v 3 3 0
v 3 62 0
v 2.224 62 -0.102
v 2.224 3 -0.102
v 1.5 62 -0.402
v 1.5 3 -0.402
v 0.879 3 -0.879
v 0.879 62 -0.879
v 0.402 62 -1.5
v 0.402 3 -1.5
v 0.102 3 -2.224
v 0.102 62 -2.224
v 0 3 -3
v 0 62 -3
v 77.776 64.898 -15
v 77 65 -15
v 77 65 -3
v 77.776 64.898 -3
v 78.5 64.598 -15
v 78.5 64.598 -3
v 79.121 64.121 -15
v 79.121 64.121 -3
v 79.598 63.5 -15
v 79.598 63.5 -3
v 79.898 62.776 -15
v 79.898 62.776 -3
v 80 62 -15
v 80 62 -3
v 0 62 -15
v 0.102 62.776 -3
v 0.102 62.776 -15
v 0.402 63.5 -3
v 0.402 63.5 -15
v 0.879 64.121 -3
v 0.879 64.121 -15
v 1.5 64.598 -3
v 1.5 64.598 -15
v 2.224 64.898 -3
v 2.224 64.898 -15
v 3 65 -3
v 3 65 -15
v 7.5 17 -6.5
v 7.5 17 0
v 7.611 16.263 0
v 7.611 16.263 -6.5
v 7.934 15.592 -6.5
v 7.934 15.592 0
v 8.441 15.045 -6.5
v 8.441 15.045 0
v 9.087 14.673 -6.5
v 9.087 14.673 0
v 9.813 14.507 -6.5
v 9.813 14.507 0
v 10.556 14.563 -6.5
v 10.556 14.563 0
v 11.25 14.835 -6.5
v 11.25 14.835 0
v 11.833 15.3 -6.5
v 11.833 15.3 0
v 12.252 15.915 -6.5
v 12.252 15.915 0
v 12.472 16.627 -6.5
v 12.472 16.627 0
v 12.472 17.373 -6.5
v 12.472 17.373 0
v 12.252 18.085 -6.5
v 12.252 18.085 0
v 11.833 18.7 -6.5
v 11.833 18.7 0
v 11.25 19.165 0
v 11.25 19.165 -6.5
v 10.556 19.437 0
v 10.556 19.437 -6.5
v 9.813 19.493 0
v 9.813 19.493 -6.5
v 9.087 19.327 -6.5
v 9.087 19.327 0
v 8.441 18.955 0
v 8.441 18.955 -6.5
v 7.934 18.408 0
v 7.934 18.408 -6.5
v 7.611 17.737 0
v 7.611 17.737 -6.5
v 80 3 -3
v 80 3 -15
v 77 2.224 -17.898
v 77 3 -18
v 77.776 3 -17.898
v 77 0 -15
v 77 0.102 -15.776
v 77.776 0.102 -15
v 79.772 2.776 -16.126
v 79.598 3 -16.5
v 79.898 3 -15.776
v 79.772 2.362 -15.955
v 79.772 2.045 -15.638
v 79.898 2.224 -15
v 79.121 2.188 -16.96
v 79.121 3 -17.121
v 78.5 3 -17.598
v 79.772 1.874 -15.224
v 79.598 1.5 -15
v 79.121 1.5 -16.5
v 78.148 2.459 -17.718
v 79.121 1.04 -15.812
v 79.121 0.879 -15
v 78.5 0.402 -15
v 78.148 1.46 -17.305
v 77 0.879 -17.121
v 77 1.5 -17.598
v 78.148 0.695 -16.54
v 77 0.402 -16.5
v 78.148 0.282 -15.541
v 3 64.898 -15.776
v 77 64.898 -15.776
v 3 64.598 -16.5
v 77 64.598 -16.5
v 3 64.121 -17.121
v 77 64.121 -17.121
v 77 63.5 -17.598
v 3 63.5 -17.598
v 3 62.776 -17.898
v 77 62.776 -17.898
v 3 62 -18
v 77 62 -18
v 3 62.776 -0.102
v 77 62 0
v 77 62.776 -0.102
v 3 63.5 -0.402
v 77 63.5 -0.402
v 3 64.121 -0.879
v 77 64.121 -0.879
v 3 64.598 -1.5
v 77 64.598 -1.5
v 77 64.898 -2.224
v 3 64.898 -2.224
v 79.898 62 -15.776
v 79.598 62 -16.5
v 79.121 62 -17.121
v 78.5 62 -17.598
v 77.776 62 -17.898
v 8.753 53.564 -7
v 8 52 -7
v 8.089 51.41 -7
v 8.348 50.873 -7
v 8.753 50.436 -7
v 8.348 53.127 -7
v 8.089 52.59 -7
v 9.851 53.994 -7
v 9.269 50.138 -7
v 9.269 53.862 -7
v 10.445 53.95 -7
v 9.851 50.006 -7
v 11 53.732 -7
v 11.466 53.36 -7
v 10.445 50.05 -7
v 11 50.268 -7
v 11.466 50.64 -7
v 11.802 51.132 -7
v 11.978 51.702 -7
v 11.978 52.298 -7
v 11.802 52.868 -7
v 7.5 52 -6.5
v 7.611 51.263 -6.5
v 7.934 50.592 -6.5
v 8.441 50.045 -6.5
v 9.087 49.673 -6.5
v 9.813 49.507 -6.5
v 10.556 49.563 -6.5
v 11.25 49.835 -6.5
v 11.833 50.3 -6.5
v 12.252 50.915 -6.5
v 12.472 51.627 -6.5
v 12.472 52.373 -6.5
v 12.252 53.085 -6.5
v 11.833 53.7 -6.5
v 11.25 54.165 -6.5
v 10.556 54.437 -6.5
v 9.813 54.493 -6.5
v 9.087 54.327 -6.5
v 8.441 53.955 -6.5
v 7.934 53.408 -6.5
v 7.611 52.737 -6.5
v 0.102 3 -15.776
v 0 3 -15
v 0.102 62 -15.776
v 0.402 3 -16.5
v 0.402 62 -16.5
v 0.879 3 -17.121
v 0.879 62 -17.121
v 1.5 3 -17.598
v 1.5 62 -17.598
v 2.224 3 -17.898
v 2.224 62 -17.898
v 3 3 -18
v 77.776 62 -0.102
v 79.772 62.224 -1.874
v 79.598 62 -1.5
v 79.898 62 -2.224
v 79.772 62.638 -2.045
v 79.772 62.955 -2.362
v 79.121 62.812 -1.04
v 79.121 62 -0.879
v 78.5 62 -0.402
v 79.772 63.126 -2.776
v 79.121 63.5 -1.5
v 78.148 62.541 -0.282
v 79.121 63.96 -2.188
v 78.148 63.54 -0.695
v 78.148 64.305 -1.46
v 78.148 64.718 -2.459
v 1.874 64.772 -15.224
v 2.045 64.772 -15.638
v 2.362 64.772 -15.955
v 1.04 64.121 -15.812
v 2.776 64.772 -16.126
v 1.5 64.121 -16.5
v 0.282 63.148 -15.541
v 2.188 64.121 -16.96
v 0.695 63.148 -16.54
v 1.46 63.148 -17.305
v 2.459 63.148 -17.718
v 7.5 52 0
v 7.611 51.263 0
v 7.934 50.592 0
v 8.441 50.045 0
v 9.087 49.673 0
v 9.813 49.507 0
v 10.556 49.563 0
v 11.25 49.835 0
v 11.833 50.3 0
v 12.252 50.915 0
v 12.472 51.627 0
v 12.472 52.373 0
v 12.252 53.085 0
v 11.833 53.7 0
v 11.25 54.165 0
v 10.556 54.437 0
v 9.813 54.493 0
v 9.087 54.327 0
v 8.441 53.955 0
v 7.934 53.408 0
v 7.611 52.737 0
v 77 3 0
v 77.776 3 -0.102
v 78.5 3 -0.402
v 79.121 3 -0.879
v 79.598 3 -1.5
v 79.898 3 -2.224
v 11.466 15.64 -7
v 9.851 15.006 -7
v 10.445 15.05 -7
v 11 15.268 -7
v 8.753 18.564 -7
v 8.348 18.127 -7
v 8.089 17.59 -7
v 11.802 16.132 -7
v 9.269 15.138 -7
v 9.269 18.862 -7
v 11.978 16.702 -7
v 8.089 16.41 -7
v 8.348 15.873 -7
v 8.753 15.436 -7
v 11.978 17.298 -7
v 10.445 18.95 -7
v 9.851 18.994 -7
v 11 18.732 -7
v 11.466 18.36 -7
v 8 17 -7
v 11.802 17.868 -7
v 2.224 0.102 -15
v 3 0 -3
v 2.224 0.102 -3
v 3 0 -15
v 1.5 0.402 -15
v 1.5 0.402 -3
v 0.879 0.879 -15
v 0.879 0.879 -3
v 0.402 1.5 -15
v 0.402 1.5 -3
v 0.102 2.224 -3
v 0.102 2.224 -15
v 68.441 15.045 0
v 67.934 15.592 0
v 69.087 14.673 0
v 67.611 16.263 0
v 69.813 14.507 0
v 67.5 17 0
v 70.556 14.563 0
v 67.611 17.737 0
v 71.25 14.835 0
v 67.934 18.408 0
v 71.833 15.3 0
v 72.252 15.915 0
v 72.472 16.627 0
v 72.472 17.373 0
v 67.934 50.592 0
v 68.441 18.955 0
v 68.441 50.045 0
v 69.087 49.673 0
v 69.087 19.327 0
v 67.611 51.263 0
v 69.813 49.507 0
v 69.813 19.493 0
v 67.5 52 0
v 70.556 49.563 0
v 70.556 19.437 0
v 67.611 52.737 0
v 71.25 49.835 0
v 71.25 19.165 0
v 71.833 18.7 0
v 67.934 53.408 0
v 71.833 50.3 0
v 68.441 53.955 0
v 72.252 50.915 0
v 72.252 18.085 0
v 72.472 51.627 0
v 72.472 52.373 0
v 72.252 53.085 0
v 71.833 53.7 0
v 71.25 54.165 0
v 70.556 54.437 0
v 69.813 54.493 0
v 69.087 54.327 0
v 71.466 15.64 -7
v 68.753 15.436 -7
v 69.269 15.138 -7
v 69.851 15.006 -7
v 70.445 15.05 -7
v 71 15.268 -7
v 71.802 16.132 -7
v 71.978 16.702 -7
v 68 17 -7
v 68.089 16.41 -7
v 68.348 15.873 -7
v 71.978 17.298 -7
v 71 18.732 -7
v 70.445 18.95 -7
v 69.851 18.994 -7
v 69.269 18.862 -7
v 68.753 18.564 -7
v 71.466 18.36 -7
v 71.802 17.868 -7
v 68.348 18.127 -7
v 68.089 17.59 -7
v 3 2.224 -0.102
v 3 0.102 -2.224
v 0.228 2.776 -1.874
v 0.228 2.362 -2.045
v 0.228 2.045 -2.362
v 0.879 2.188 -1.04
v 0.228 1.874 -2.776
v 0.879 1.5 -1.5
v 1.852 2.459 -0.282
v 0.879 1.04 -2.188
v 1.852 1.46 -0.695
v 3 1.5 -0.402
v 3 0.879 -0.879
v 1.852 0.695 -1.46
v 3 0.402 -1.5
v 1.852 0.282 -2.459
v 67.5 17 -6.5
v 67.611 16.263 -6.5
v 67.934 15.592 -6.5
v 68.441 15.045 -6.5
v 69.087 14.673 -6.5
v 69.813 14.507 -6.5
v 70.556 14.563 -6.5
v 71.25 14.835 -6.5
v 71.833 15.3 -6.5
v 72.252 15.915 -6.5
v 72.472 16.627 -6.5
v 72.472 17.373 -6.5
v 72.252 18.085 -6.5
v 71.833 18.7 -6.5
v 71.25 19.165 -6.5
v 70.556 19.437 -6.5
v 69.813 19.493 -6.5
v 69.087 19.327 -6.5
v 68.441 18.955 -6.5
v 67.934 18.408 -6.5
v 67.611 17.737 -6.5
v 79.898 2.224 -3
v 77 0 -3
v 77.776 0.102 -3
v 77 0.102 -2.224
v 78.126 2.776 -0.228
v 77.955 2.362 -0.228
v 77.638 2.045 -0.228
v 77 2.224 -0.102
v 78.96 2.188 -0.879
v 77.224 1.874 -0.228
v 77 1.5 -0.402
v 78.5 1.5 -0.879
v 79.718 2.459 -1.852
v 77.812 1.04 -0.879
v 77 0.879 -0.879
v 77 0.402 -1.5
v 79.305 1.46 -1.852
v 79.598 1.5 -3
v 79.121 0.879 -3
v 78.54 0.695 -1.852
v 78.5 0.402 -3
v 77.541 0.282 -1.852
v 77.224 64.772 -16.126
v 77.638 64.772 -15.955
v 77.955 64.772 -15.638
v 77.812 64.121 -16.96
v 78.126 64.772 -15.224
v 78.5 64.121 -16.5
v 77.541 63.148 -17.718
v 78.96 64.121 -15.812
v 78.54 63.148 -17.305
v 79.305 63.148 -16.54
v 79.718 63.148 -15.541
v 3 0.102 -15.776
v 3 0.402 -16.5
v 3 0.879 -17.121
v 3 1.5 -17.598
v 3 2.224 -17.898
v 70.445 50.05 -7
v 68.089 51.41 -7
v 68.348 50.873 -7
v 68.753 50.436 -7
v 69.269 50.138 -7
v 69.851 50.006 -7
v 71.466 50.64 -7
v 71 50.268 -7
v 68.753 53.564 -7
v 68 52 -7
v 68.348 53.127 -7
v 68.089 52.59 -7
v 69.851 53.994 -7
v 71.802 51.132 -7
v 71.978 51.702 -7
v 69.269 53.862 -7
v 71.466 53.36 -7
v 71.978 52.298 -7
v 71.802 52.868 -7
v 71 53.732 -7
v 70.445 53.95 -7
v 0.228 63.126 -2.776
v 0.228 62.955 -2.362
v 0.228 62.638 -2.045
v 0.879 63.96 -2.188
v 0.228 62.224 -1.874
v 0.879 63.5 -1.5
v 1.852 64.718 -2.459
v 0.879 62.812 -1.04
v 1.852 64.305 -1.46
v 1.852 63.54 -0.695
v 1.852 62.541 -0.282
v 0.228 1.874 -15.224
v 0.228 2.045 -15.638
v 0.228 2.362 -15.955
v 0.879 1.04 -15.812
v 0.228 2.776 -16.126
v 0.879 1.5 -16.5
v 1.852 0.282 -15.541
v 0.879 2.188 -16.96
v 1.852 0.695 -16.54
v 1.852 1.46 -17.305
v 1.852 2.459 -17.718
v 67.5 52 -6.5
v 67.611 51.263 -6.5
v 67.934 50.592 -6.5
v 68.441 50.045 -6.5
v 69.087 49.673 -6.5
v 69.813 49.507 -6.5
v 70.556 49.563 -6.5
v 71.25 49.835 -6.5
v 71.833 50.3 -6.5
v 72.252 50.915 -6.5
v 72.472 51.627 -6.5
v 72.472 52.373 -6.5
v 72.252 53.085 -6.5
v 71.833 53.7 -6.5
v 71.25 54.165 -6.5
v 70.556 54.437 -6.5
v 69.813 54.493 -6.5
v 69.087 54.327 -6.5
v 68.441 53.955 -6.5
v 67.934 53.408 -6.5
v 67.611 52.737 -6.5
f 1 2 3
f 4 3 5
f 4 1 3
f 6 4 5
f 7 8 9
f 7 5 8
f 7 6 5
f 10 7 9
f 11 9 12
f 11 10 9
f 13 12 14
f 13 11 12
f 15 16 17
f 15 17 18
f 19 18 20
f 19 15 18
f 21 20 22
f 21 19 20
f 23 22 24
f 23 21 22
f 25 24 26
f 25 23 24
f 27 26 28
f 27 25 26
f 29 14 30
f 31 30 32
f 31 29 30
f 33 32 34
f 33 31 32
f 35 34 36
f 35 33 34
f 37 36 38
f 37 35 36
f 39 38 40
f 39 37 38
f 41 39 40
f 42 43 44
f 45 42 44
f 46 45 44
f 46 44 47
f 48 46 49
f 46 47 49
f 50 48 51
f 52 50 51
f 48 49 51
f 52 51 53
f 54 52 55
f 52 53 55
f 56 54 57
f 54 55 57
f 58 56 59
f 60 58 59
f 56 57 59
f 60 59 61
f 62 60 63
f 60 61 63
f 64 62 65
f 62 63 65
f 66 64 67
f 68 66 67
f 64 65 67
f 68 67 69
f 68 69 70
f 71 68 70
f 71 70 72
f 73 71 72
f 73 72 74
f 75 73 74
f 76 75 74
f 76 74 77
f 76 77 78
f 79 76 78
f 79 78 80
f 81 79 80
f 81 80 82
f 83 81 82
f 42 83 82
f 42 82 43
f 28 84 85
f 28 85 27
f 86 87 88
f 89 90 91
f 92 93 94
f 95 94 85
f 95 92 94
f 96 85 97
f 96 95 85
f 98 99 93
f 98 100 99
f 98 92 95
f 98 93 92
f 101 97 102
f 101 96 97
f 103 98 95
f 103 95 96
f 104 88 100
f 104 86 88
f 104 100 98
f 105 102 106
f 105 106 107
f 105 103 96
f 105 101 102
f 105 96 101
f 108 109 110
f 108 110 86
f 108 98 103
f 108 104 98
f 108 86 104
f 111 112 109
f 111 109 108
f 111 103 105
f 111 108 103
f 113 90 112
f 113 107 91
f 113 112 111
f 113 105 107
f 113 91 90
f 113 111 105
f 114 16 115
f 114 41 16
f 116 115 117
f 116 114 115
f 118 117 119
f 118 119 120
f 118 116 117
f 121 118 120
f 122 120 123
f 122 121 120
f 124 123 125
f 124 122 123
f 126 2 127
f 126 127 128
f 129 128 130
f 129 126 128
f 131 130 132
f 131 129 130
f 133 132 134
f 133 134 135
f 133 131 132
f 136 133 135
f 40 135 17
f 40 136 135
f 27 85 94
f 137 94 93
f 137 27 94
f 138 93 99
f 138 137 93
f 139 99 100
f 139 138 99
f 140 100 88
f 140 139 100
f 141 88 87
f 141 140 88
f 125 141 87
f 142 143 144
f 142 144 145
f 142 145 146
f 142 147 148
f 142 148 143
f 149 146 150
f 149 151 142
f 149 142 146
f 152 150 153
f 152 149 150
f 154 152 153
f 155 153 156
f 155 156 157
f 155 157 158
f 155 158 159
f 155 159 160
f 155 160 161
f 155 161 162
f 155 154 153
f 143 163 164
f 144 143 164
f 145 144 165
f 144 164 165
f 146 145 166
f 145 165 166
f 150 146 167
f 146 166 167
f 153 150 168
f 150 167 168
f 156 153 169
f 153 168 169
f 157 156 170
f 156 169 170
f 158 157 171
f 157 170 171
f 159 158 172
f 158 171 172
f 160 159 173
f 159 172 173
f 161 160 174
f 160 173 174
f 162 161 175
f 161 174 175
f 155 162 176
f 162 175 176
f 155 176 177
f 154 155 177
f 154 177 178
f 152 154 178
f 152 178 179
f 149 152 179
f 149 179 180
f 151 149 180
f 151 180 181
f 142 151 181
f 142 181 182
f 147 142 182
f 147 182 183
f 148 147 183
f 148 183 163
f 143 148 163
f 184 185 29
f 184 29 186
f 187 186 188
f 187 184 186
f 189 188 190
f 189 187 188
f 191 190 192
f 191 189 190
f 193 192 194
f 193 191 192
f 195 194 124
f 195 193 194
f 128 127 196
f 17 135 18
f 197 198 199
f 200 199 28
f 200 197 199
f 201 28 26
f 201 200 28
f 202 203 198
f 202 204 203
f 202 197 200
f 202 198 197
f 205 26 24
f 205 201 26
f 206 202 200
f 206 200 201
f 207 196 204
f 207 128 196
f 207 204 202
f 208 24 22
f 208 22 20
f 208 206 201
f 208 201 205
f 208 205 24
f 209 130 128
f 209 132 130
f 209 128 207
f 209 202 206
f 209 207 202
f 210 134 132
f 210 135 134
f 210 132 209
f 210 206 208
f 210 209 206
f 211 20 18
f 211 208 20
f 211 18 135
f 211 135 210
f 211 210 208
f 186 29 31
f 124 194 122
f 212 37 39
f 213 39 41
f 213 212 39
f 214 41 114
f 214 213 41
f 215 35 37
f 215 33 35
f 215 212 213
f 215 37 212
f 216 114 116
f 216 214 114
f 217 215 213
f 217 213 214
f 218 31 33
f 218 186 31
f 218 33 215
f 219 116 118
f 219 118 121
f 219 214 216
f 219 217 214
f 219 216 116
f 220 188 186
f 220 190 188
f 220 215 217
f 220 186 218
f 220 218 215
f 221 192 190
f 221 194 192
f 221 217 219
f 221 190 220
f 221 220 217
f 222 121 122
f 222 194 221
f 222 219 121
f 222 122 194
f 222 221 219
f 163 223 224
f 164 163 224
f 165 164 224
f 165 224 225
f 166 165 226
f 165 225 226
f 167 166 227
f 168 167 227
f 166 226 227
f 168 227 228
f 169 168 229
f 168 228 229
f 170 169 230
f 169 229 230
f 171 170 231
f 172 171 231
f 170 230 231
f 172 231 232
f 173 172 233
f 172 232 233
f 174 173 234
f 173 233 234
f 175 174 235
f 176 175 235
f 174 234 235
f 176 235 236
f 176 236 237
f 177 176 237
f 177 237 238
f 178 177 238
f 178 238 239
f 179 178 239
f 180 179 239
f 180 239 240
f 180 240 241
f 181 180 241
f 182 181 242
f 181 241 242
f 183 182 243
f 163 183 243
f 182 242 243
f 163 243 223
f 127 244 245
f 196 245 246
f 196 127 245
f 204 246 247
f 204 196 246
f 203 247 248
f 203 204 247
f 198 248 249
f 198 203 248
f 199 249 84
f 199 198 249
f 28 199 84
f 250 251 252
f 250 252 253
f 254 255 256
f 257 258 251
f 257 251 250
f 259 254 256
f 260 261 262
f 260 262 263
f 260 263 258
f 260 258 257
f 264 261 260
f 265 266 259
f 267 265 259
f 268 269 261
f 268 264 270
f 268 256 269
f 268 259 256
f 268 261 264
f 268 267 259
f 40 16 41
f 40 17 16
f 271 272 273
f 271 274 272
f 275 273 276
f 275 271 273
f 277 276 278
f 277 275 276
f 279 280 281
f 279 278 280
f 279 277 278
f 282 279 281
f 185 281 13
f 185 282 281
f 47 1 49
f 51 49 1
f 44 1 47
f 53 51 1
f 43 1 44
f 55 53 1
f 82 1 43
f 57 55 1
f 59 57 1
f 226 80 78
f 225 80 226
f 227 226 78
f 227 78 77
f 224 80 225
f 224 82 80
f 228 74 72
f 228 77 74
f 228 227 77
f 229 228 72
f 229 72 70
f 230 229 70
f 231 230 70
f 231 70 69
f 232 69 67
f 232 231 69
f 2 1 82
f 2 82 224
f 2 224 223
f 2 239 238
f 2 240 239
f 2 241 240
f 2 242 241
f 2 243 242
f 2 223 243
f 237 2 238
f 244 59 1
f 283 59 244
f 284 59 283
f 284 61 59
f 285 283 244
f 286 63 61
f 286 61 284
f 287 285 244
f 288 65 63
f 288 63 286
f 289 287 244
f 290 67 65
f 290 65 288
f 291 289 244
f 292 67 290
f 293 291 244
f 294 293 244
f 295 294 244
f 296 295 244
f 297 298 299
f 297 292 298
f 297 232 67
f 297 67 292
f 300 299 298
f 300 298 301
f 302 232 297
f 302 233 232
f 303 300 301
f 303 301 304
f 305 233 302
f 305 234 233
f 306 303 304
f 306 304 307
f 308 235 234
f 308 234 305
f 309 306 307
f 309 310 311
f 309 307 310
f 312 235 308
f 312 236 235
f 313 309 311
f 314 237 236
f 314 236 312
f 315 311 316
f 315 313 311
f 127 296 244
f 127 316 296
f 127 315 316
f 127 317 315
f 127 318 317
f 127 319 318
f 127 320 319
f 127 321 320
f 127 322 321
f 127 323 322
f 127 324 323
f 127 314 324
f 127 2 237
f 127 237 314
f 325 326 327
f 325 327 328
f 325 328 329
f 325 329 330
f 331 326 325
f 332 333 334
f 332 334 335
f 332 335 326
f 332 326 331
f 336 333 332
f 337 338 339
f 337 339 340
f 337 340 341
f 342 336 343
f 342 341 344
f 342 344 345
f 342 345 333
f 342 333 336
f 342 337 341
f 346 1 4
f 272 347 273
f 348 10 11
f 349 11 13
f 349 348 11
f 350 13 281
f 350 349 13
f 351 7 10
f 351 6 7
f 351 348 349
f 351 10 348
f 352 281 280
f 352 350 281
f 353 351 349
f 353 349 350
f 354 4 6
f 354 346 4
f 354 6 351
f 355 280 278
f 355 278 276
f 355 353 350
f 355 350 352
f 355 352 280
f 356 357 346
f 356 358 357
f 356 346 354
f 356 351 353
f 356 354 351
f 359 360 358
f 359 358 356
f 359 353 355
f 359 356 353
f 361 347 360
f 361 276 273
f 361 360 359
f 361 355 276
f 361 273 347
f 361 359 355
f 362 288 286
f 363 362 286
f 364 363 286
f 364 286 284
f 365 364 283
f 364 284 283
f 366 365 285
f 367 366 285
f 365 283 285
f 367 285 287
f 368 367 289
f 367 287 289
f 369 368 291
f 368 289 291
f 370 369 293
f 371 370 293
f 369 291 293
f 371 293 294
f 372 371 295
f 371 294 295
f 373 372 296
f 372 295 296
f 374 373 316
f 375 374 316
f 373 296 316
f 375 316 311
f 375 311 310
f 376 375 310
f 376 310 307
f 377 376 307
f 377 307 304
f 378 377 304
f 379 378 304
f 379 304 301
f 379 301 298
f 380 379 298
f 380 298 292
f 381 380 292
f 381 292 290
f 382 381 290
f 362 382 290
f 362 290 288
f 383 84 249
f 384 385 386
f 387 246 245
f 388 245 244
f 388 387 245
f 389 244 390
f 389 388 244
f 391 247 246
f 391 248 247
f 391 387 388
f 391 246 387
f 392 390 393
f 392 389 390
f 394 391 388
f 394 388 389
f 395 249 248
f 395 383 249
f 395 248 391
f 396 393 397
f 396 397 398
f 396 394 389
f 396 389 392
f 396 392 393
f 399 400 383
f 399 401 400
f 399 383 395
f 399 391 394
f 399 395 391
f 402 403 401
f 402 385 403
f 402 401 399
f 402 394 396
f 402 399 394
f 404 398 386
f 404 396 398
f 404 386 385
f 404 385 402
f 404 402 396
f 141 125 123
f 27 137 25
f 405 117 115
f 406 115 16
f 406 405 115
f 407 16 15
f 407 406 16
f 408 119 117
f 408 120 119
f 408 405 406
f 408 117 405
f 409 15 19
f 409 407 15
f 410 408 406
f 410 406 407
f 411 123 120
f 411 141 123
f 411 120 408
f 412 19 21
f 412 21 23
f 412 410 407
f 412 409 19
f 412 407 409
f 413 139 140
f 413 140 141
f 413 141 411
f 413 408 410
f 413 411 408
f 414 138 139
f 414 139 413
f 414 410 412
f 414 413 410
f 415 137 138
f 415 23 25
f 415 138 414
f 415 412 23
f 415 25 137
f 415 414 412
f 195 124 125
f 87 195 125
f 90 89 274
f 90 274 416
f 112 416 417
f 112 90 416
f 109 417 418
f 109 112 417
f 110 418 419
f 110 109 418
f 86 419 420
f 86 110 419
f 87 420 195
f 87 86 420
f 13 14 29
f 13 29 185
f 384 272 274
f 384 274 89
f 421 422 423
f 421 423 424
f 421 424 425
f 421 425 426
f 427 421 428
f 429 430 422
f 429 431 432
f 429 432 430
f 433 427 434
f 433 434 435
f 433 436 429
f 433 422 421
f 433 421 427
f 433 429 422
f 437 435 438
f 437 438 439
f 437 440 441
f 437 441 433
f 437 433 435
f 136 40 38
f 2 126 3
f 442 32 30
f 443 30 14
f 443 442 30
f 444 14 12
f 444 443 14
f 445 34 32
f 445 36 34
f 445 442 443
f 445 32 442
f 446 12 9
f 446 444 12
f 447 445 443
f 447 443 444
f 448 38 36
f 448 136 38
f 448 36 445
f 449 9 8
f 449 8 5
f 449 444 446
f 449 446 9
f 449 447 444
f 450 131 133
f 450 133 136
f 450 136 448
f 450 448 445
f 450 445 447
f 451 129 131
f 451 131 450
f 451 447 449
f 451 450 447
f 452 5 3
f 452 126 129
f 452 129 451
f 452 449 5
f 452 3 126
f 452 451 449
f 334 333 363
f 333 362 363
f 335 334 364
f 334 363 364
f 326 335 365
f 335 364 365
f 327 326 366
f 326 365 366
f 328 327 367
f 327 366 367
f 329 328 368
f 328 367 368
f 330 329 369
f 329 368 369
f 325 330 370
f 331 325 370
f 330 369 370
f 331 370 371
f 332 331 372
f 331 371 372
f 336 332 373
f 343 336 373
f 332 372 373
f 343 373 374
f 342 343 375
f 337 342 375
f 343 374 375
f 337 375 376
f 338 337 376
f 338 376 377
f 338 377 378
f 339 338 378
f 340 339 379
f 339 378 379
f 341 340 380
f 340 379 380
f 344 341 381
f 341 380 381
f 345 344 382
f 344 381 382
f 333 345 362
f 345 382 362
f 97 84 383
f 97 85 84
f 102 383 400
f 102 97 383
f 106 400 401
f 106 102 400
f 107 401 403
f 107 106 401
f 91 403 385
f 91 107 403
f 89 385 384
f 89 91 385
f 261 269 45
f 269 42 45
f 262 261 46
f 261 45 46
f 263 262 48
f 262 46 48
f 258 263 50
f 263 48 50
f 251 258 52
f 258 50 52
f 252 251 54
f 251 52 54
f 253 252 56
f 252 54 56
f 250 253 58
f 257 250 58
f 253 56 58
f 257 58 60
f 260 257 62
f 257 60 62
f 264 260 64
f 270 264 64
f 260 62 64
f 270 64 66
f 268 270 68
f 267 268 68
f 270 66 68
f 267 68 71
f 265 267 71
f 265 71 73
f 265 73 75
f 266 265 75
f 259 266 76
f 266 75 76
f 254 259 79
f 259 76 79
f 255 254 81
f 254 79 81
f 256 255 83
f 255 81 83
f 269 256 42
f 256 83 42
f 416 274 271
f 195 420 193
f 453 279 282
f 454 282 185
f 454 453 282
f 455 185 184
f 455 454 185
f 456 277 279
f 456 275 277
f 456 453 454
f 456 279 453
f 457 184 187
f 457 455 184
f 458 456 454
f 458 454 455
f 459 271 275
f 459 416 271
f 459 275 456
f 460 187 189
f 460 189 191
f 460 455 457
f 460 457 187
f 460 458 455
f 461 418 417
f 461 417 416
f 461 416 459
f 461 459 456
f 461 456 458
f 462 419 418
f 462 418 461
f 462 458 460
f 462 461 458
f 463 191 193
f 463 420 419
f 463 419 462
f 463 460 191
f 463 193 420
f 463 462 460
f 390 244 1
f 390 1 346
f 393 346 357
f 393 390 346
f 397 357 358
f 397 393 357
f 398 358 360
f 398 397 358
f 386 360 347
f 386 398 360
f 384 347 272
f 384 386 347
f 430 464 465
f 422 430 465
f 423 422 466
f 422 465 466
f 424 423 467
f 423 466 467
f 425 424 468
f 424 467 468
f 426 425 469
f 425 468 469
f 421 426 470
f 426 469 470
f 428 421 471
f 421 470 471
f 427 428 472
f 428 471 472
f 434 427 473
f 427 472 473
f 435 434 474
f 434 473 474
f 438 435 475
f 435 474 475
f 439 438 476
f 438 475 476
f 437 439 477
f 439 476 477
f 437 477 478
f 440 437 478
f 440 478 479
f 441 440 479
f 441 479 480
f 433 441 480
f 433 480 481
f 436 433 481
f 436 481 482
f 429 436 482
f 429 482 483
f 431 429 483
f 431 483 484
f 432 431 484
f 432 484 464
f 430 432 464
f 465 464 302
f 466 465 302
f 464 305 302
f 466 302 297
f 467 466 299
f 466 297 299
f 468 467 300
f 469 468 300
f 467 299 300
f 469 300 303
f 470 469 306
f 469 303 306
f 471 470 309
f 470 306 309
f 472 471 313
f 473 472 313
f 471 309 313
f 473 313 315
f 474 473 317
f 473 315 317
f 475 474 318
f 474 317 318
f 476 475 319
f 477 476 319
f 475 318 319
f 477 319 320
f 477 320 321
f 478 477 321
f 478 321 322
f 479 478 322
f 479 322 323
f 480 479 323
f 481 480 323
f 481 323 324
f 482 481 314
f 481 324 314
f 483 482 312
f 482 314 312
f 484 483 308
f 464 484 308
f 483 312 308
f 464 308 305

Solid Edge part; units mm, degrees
sketch "Sketch1" plane through (0, 0, 0) normal (0, 0, 1) x (1, 0, 0)
  line L0 (80, 65) -> (0, 65)
  line L1 (0, 65) -> (0, 0)
  line L2 (0, 0) -> (80, 0)
  line L3 (80, 0) -> (80, 65)
extrude "Protrusion1" add sketch "Sketch1" against normal blind 18
fillet "Redondo_1" radius 3 12 edges at (40, 0, -18) (80, 0, -9) (40, 65, 0) (80, 32.5, 0) (40, 0, 0) (0, 32.5, 0) (80, 32.5, -18) (80, 65, -9) (0, 32.5, -18) (0, 65, -9) (40, 65, -18) (0, 0, -9)
sketch "Sketch2" plane through (40, 32.5, 0) normal (0, 0, 1) x (-1, 0, 0)
  circle A0 centre (30, 15.5) radius 2.5
  circle A1 centre (30, -19.5) radius 2.5
  circle A2 centre (-30, 15.5) radius 2.5
  circle A3 centre (-30, -19.5) radius 2.5
extrude "Recorte_Extrudado_2" cut sketch "Sketch2" against normal blind 7
chamfer "Chanfro_2" distance 0.5 angle 45 4 edges at (12.5, 17, -7) (12.5, 52, -7) (72.5, 52, -7) (72.5, 17, -7)
properties material "PVC"
